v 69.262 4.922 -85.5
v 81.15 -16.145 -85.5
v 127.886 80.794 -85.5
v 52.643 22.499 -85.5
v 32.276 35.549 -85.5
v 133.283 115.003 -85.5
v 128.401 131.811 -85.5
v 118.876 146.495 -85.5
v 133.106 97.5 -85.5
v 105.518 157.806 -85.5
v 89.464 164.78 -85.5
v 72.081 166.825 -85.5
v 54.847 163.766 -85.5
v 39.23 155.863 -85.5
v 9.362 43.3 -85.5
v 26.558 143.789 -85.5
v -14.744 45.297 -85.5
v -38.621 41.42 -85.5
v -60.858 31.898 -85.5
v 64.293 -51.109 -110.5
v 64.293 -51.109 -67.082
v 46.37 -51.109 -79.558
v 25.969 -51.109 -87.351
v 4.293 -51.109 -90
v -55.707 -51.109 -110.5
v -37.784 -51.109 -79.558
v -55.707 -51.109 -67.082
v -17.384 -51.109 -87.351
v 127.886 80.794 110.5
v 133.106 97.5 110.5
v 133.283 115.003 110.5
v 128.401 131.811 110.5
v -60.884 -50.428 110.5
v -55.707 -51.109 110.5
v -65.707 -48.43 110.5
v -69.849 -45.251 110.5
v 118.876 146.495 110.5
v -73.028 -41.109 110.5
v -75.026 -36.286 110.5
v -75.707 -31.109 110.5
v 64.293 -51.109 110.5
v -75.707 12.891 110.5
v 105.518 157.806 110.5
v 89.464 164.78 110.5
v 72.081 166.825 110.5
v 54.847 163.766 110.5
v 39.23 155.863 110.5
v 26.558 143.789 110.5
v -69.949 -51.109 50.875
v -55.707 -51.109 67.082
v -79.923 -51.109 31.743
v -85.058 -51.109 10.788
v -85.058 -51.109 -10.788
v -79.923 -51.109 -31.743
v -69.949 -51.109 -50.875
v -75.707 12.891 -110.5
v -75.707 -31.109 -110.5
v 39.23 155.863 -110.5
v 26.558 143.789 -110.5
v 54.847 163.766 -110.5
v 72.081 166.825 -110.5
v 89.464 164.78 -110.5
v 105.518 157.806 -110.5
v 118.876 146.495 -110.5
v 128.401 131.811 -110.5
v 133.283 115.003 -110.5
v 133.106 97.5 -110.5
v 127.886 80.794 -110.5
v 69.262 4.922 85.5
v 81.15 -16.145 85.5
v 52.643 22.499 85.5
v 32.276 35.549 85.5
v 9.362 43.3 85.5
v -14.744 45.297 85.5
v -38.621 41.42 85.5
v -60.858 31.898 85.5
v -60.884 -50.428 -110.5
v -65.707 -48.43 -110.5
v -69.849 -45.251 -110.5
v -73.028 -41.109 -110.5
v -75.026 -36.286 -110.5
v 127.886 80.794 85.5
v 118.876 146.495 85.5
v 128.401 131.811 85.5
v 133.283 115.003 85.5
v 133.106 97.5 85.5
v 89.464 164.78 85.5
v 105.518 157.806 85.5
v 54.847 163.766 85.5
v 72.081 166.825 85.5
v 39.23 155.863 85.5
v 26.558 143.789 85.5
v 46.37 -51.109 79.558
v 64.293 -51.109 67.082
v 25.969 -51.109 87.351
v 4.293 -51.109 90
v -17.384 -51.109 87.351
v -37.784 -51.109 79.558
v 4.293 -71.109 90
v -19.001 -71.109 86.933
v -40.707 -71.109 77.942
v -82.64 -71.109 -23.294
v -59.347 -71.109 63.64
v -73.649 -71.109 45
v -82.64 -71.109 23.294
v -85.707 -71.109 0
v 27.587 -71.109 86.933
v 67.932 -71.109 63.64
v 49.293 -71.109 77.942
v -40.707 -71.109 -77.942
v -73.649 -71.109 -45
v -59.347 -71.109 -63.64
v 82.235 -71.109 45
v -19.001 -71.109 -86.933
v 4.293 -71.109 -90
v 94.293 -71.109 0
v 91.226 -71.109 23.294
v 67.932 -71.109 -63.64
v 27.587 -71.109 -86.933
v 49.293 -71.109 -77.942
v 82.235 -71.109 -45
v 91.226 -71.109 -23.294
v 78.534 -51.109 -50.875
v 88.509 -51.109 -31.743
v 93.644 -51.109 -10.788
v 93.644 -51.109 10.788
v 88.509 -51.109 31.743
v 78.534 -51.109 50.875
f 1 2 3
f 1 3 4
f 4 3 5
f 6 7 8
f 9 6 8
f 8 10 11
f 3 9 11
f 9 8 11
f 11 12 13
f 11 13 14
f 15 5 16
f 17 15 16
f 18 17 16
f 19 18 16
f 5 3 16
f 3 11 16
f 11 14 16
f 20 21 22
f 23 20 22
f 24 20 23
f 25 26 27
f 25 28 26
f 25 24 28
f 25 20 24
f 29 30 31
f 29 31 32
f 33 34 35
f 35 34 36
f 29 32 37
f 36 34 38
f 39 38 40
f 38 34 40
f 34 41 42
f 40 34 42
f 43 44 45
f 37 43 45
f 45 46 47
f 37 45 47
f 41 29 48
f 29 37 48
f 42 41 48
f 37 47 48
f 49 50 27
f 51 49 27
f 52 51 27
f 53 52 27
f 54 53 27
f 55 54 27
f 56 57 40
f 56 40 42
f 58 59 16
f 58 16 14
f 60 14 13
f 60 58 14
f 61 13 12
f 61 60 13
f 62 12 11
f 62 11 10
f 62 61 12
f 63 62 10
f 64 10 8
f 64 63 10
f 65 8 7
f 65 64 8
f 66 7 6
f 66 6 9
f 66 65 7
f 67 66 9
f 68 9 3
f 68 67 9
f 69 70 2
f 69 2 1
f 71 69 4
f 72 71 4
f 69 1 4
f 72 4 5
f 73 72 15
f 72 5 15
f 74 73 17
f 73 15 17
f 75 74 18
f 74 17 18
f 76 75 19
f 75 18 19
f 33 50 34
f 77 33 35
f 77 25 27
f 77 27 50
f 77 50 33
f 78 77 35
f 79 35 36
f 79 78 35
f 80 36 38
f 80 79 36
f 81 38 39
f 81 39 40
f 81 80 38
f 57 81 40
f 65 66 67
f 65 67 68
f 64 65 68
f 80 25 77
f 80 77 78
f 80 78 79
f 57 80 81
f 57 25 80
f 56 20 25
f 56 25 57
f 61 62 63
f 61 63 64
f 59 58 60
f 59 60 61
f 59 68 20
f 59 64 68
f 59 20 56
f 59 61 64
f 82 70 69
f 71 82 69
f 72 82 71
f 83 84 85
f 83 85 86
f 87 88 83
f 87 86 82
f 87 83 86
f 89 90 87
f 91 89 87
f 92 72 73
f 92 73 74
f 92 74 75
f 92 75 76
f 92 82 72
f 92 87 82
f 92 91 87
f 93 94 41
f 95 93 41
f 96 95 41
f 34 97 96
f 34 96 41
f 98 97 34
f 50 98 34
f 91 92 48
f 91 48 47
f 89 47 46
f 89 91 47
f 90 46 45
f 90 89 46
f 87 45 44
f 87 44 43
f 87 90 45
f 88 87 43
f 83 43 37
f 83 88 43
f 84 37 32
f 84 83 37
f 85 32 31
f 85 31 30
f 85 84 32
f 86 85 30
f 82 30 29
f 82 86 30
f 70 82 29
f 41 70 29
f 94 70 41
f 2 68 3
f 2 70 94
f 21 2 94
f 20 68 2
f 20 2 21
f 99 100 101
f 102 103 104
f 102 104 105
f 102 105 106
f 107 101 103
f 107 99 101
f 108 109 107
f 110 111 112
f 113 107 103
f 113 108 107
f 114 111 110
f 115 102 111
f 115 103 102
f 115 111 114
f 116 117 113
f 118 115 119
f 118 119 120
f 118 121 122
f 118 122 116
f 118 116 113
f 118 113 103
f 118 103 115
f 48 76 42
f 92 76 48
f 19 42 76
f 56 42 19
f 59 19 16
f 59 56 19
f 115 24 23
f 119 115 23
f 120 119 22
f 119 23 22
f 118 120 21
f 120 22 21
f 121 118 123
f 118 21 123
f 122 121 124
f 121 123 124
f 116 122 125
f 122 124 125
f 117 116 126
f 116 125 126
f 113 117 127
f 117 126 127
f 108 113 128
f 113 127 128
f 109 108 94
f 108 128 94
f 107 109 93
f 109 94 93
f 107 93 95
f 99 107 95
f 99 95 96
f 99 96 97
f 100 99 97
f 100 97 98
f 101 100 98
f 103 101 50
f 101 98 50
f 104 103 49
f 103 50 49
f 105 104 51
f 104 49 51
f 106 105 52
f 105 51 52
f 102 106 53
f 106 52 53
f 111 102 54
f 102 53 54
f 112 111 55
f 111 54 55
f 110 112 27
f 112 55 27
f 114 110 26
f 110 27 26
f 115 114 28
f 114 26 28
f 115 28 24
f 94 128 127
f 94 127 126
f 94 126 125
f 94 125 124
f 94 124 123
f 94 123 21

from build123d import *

# Parameters (mm, degrees)
BOSS_EXTRUDE1_DEPTH      = 110.5
BOSS_EXTRUDE1_DEPTH_BACK = 110.5
CUT_EXTRUDE1_DEPTH       = 85.5
CUT_EXTRUDE1_DEPTH_BACK  = 85.5
SKETCH3_R                = 90
BOSS_EXTRUDE2_DEPTH      = 20
BODY_MOVE_COPY1_ANGLE    = 90


with BuildPart() as part:
    # Sketch1 → Boss-Extrude1 (new, two sides: drawn at the far end of the back side and taken through both)
    with BuildSketch(Plane(origin=(0, 0, 0), x_dir=(0, 0, -1), z_dir=(1, 0, 0)).offset(-BOSS_EXTRUDE1_DEPTH_BACK)):
        with BuildLine():
            Line((-64.292863754, -51.10932545), (55.707136246, -51.10932545))
            ThreePointArc((55.707136246, -51.10932545), (69.84927187, -45.251461074), (75.707136246, -31.10932545))
            Line((75.707136246, -31.10932545), (75.707136246, 12.89067455))
            Line((75.707136246, 12.89067455), (-26.557571018, 143.789344322))
            ThreePointArc((-26.557571018, 143.789344322), (-105.517875867, 157.806043193), (-127.885671837, 80.793840961))
            Line((-127.885671837, 80.793840961), (-64.292863754, -51.10932545))
        make_face()
    extrude(amount=BOSS_EXTRUDE1_DEPTH + BOSS_EXTRUDE1_DEPTH_BACK)

    # Sketch2 → Cut-Extrude1 (cut, two sides: drawn at the far end of the back side and taken through both)
    with BuildSketch(Plane(origin=(0, 0, 0), x_dir=(0, 0, -1), z_dir=(1, 0, 0)).offset(-CUT_EXTRUDE1_DEPTH_BACK)):
        with BuildLine():
            Line((-127.885671837, 80.793840961), (-81.149808611, -16.144925076))
            ThreePointArc((-81.149808611, -16.144925076), (-21.055510127, 40.123069763), (60.857619094, 31.898033921))
            Line((60.857619094, 31.898033921), (-26.557571018, 143.789344322))
            ThreePointArc((-26.557571018, 143.789344322), (-105.517875867, 157.806043193), (-127.885671837, 80.793840961))
        make_face()
    extrude(amount=CUT_EXTRUDE1_DEPTH + CUT_EXTRUDE1_DEPTH_BACK, mode=Mode.SUBTRACT)

    # Sketch3 → Boss-Extrude2 (add)
    with BuildSketch(Plane.XZ.offset(51.10932545)):
        with Locations((0, 4.292863754)):
            Circle(SKETCH3_R)
    extrude(amount=BOSS_EXTRUDE2_DEPTH)


with BuildPart() as part_1:
    # Body-Move/Copy1: moved
    add(part.part.rotate(Axis((0, 0, 0), (0, 1, 0)), BODY_MOVE_COPY1_ANGLE))


solid = part_1.part
